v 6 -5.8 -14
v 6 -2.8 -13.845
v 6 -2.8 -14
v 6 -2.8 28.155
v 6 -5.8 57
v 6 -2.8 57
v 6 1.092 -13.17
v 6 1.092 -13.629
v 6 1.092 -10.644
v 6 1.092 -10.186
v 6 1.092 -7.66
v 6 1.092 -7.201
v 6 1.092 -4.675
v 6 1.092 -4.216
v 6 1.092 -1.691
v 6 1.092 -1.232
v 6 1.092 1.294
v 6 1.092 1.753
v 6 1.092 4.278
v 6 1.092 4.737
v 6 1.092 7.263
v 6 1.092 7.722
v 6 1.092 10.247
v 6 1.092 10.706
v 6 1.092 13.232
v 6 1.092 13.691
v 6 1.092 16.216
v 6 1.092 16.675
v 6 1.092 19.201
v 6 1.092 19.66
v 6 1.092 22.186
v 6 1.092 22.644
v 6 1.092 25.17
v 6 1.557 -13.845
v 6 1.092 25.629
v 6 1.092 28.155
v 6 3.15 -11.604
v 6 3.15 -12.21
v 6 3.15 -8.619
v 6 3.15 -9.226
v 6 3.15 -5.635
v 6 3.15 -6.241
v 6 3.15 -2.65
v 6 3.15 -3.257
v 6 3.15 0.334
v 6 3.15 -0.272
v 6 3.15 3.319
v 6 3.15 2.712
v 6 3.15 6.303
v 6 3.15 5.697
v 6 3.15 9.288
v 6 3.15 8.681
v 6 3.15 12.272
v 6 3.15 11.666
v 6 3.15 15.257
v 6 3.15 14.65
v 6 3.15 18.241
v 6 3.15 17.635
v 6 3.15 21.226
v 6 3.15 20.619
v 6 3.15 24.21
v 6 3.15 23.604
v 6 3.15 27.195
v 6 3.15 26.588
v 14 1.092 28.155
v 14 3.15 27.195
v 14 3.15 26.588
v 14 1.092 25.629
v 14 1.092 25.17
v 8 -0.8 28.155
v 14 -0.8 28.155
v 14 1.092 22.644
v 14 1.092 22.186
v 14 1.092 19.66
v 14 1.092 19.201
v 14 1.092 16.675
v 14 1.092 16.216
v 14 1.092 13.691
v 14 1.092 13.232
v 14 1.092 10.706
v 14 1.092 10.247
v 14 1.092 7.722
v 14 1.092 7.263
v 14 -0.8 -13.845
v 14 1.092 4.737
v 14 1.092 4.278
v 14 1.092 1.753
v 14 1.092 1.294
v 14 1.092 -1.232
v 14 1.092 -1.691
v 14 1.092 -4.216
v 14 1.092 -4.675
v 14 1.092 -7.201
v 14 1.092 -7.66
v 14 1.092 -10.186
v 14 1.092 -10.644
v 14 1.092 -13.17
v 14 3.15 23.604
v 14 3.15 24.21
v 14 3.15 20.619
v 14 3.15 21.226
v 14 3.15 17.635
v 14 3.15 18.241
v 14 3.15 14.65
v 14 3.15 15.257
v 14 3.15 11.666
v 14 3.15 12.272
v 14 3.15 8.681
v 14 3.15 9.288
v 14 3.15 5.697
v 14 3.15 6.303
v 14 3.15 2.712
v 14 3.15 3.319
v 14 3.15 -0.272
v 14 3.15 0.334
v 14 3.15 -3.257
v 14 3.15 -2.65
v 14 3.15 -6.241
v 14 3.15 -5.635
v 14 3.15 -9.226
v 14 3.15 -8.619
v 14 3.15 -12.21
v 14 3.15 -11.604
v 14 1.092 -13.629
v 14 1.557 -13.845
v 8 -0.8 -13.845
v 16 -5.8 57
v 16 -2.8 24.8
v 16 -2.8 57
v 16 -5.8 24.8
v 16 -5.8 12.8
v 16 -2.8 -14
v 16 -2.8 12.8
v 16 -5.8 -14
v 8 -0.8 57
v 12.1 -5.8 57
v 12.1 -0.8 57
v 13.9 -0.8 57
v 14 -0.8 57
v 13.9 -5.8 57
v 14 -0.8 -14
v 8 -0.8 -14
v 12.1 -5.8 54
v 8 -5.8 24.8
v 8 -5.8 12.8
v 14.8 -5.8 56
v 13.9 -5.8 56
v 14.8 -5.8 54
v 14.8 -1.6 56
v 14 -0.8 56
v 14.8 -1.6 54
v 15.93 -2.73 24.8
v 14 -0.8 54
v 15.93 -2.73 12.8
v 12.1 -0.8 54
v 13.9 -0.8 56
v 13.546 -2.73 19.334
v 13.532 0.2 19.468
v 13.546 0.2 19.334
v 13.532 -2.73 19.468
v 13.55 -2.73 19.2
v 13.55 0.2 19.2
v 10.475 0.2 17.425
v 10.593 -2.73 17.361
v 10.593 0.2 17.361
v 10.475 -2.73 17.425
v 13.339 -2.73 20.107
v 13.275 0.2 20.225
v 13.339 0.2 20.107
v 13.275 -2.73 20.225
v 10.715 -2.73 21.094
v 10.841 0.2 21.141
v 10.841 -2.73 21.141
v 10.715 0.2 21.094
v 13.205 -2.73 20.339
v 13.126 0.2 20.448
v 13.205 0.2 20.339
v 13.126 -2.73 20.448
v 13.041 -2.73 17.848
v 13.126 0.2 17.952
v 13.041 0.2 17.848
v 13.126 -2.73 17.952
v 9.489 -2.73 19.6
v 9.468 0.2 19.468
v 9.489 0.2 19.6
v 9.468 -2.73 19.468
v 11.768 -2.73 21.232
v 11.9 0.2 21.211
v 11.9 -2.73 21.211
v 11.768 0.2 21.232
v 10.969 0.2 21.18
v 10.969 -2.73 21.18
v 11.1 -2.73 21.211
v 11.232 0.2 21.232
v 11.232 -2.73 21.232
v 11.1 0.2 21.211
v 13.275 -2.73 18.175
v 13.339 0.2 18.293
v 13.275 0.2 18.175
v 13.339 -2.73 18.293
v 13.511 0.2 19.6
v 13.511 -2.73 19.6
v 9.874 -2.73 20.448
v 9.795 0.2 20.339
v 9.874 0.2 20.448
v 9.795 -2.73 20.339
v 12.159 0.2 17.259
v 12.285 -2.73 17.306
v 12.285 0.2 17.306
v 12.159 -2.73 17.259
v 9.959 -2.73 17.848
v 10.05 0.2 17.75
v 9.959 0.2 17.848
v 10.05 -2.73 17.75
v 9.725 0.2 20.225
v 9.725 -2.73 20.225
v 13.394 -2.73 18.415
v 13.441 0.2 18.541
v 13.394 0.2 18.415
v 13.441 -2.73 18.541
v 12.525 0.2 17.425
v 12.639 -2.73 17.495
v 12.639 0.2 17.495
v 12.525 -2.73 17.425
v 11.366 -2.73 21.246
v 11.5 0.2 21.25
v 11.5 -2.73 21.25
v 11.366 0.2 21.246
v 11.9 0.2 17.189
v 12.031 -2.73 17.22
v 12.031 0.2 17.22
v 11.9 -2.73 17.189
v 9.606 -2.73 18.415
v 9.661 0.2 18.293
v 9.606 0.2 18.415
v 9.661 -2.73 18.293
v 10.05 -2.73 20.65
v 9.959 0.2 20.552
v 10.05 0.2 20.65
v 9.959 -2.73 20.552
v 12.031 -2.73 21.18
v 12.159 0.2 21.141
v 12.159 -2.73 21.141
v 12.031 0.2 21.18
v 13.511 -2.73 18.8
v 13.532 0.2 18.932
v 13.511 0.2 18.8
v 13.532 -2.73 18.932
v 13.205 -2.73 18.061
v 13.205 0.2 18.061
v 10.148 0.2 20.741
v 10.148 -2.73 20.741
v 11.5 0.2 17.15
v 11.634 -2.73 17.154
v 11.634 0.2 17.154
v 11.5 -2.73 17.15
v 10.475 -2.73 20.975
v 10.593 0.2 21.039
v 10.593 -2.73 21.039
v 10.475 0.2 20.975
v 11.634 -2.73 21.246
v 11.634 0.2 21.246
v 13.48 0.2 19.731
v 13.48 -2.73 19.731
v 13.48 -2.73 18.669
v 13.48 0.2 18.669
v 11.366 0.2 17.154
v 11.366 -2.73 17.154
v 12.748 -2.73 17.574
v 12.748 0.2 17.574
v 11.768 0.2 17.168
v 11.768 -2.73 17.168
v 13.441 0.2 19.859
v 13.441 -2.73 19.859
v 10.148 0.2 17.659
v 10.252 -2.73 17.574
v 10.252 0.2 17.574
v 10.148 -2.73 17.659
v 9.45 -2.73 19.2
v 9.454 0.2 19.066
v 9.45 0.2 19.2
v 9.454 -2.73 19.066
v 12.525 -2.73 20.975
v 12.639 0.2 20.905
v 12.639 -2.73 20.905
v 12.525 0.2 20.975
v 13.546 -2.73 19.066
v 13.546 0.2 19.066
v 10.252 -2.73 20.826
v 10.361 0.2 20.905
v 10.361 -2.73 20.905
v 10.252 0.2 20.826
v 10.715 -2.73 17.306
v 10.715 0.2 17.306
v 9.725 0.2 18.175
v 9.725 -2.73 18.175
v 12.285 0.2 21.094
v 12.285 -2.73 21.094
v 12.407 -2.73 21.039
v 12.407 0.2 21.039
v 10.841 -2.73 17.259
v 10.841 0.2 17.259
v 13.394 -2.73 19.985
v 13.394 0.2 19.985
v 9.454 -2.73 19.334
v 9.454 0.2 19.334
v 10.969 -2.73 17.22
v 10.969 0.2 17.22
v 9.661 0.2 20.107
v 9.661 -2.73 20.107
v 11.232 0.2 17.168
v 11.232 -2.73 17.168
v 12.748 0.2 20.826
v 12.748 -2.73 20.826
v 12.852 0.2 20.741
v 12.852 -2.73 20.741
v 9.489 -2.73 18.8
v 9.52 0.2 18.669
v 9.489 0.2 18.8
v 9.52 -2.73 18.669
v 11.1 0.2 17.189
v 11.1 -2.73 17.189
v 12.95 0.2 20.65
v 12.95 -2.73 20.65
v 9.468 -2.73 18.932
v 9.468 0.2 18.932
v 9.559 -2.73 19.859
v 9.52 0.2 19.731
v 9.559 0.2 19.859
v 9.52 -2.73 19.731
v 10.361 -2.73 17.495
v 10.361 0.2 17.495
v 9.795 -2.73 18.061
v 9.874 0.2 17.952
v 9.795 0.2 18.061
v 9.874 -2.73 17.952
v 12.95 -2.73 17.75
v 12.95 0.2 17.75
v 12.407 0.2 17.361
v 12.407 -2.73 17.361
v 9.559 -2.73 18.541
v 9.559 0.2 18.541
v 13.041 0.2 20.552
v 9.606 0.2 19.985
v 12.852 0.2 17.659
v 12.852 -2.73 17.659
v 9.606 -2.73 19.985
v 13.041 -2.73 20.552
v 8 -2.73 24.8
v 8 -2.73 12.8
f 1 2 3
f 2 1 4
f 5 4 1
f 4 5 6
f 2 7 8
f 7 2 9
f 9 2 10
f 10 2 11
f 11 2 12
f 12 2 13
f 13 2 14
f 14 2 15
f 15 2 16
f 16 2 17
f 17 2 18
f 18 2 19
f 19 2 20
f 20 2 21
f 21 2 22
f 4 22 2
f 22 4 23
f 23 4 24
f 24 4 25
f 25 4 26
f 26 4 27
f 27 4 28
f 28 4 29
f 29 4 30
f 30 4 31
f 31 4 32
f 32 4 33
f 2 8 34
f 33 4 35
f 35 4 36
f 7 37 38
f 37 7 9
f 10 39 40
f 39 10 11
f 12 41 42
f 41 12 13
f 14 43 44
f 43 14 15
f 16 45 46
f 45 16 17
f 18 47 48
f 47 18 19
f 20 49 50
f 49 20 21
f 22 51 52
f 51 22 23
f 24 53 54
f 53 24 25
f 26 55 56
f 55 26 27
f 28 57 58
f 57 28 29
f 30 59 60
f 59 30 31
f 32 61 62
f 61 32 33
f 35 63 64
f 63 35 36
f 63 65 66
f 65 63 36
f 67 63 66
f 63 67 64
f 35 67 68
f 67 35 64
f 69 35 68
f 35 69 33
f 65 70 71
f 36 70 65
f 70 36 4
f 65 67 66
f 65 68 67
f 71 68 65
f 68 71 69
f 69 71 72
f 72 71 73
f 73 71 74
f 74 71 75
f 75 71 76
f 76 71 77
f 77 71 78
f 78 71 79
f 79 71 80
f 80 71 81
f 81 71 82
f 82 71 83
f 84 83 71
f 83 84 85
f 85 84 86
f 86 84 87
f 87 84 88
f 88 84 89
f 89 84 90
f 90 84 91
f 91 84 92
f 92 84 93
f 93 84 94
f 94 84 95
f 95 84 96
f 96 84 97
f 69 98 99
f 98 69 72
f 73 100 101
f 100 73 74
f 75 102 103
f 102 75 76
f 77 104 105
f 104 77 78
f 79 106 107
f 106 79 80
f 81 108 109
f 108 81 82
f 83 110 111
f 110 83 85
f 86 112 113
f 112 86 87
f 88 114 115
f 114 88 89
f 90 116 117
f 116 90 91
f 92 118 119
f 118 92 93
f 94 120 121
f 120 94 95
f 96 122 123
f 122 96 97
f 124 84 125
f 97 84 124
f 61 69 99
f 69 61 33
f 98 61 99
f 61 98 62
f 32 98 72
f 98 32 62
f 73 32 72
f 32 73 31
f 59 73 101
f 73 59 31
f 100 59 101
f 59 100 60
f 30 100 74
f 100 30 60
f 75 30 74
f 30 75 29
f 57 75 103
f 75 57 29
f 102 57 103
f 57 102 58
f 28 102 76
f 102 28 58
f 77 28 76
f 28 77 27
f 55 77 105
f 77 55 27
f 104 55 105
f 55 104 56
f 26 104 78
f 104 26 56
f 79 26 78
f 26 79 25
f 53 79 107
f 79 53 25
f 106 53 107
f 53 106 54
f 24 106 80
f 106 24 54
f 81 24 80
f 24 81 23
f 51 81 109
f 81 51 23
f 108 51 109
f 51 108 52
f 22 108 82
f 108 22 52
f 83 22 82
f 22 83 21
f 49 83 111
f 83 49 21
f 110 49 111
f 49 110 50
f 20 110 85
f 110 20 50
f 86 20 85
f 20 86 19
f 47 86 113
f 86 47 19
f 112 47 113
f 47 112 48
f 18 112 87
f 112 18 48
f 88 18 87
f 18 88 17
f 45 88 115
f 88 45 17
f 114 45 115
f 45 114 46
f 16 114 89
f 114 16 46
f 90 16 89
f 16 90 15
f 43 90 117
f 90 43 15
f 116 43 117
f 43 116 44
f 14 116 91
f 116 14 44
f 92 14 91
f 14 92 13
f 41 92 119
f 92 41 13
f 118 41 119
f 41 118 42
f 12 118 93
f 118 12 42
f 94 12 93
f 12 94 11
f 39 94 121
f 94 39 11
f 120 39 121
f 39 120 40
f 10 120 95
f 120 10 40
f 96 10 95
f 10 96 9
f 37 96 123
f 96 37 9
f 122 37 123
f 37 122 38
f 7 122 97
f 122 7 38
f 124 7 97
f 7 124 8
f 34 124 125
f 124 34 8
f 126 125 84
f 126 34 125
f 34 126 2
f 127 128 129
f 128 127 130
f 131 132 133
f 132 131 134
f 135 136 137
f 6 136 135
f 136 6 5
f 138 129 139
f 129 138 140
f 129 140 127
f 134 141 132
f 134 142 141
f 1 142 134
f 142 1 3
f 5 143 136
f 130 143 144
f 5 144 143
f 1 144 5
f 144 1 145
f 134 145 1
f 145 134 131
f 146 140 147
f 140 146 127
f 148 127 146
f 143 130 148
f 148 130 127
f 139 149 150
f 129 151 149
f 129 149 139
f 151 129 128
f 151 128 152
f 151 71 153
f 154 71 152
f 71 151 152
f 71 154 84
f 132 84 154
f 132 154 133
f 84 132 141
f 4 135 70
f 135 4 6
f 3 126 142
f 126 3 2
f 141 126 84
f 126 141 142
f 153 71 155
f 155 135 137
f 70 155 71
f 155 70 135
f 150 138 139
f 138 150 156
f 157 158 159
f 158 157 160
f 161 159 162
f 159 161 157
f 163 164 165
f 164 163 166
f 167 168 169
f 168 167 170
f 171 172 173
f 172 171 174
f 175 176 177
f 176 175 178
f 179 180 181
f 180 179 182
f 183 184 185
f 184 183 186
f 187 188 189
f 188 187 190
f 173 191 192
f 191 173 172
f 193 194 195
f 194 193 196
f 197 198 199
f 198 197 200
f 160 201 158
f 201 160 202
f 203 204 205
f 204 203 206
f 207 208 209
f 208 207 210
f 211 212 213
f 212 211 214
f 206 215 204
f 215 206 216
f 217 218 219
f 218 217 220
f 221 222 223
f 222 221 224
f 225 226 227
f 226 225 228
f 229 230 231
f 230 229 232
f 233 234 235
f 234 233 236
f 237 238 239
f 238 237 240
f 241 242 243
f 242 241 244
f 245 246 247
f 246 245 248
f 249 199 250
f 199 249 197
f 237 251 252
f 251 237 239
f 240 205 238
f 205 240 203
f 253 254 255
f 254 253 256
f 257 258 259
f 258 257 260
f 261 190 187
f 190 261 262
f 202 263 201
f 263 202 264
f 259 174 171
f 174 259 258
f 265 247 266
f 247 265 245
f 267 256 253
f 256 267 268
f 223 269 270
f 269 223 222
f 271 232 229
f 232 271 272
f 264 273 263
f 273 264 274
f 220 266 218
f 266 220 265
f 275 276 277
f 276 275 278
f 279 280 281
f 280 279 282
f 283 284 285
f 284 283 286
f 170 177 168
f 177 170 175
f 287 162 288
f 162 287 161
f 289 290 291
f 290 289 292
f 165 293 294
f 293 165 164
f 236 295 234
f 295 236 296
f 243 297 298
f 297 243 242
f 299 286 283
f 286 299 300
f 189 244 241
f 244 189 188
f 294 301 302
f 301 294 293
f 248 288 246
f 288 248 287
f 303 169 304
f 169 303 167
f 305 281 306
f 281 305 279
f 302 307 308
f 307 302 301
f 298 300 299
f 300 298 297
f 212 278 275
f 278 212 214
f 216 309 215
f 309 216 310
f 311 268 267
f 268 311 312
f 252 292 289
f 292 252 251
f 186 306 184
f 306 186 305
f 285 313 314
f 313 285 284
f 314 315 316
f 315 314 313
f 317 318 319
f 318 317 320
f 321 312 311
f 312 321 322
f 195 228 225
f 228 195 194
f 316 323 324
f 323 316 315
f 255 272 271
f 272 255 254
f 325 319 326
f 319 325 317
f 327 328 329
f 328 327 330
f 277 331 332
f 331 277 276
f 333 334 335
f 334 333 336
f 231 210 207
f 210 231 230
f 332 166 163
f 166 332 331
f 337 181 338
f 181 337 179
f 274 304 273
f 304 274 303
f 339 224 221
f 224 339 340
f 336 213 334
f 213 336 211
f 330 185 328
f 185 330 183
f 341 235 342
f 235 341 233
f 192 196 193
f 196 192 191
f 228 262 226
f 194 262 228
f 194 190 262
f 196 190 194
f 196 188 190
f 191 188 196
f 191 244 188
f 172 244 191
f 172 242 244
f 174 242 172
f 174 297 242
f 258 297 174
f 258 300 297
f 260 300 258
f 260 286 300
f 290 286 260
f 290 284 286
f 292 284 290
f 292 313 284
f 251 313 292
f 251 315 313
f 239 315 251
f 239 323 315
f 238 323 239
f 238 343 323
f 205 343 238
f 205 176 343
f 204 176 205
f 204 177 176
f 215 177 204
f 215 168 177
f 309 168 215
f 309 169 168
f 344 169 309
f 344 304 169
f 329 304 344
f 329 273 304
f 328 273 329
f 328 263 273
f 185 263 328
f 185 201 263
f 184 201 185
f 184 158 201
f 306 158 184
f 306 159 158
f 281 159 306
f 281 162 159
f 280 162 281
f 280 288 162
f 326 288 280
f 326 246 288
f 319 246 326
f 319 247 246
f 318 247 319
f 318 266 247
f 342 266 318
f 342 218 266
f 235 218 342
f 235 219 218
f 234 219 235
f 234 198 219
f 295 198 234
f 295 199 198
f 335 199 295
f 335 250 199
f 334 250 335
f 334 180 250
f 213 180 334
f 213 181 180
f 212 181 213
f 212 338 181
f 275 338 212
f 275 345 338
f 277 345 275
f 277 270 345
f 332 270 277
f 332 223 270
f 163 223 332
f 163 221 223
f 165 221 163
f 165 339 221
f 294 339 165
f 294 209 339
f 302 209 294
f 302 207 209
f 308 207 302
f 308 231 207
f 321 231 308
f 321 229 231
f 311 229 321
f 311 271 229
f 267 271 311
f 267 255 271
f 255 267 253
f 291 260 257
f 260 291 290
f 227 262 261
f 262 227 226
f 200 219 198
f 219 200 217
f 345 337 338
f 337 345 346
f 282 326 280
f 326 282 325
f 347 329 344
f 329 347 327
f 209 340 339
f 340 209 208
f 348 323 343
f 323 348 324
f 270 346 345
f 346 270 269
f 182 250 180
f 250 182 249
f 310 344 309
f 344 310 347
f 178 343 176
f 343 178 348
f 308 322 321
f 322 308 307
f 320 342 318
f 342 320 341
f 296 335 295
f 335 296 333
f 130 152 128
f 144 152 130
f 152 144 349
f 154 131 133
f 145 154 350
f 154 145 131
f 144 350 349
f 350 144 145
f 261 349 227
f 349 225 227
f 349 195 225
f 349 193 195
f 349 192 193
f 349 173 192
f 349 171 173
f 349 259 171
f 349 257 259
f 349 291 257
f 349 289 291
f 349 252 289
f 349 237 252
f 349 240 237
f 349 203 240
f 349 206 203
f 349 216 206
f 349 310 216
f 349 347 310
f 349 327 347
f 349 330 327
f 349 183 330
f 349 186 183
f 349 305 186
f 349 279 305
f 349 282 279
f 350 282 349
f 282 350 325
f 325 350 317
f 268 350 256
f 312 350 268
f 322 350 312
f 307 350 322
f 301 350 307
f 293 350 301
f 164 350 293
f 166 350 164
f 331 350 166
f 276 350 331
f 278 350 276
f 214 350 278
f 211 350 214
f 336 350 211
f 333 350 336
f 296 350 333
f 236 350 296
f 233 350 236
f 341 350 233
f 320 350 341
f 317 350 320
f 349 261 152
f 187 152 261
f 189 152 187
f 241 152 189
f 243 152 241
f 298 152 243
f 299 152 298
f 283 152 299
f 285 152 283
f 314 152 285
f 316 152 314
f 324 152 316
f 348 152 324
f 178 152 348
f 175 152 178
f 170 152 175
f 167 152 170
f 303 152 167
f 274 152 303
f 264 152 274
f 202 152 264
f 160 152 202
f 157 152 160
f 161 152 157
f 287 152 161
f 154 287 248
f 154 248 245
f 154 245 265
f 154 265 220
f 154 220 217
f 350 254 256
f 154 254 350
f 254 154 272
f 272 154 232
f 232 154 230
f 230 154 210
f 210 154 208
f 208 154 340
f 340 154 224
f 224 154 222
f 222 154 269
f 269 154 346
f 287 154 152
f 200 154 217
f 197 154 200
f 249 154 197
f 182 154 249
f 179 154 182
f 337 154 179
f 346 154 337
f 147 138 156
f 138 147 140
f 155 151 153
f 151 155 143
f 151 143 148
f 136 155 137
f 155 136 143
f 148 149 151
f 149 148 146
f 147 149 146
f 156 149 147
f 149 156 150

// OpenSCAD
$fn = 96;

// Redesigned and modified from https://www.thingiverse.com/thing:5719788
// Now available in OpenSCAD, for further modifications
// Gears from: https://www.thingiverse.com/thing:1604369
// Its mostly in german, but you should be ok...
// To Do:
// Implement gears as imported library

//color("DarkSlateGray") translate([-25,8,9.6]) rotate([90,0,90]) import("StepMotorModelScaled.stl");

//Z_rail ();
//Z_gearwheel ();
Z_rackpen ();

//linear_extrude(32, center=true, scale=1) polygon(points=[[0,0],[2,2],[8,2],[10,0]]);


//color("fuchsia") translate([0,tight-0.2,15]) Z_rack ();
// Z-rack with mounatble penHolder
module Z_rackpen(){
  translate([0,0,10]) difference(){
    color("fuchsia") translate([0,tight-0.2,15]) Z_rack ();
    translate([11.5,0.2,9.2]) rotate([90,0,0]) cylinder(21, d=4.1, center=false); // penholder-Holes
    translate([13,-6.68+tight,8.8]) cube([10,3.1,12], center = true); 
    translate([13.0,-6.68+tight,50]) cube([1.8,18.1,12], center = true); 
    translate([13.8,-6.68+tight,45]) cube([2.0,18.1,2], center = true); 
  }
}

//translate([25.5,-6.8+tight,18.5]) penHolder();
//translate([25.5,-6.8+tight,18.5]) brushInsert();
// handWheel();

// general shape of mechanism
round_edge = 3; // dont go more than 5
slide_tol = 0.6; // adjust this for tolerance
tight = 2.4; // Moves the rack closer to the wheel. Needs to be changed when gearwheel size changes
dist = 6; // i dont know what this parameter does...
overallHeight = 64; // not yet implemented

// gears and wheels
tooth_angle = 0;
tooth_size = 1; // modul = Height of the tooth tip above the pitch line
rackWidth = 8; // width of rack with teeth
rackDepth= 6; // depth of rack with teeth (some mistake when this is not 6)

// Holes and screws
M3_screwhole = 2.8; // tight to screw into it
M3_hole = 3.5; // loose to push screw through it
M3_screwhead = 5.8; // lower the screwhead into the material
M4_screwhole = 3.9; // tight to screw into it
brushHole = 6.5;

module brushInsert(){
    difference(){
      cylinder(h = 13, d = 10.4, center = true);
      #cylinder(h = 22, d = brushHole, center = true);
      translate([0,-0,0]) rotate([90,0,0]) cylinder(14, d=4, center=false); // penholder-Holes
    }
}

module handWheel() difference(){
    minkowski(){
    stirnrad (modul=2, zahnzahl=8, breite=3, bohrung=3.8, eingriffswinkel=30, schraegungswinkel=tooth_angle, optimiert=true);
         $fn=30;
            sphere(d=1); 
    }
    translate([0,-0,-2]) cylinder(14, d=3.7, center=false); // penholder-Holes
    }

module penHolder(){

    difference(){
        minkowski(){
        union(){            
            cylinder(h = 11, d =12, center = true);
            translate([0,-7,0]) rotate([90,0,0]) cylinder(h = 3, d =8, center = true);
          }
            $fn=30;
            sphere(d=2);  
        }
        cylinder(h = 23, d =11, center = true);
        translate([0,-2,0]) rotate([90,0,0]) cylinder(20, d=3.8, center=false); // penholder-Holes
    }


    difference(){
        union(){
            translate([-11.5,0,-0.8]) cube([12,3,11.3], center = true);
            translate([-14,-3,0]) rotate([90,0,0]) cylinder(h = 3, d =7, center = true);
        }
    translate([-14,10,0]) rotate([90,0,0]) cylinder(20, d=2.9, center=false); // penholder-Holes
    
    }
}

module Z_rail (){
difference(){
  minkowski(){
    union(){
        difference(){
            translate([1,-10,20+4]) cube([14-round_edge,10-round_edge,46+8-round_edge],center=true); // Vertikal
            translate([2,-18,2]) cube([20,50,32+8]);
            translate([2,-9,-12+2]) cube([20,50,30]);
            
        }
    translate([-3,8,8]) cube([6-round_edge,46-round_edge,12-round_edge],center=true); // Balken
        difference(){
            translate([11,-4,12+4]) cube([18-round_edge,22-round_edge,62+8-round_edge],center=true); // Z-Rail
            translate([10,7.0,36.5]) cube([28.0,10.1,30], center = true);
            translate([0,-18,2]) cube([20,50,40]);
            translate([0,-3+2,-32+0]) cube([20,50,60]);
           
        }
    }
    $fn=30;
    sphere(d=round_edge);
  }
 #translate([rackWidth/2+dist+1,-rackDepth-0.5+tight-0.5*slide_tol,14]) cube([rackWidth+2+slide_tol,3+0.5*slide_tol,70+8],center=true); // Führung
  translate([rackWidth/2+dist,-2+tight-0.5*slide_tol,0]) cube([rackWidth+slide_tol,rackDepth+0.5*slide_tol,70],center=true); // Führung
  translate([rackWidth/2+dist-4,-4.55+tight-1*slide_tol,15.9]) rotate([0,0,0]) linear_extrude(78.2, center=true, scale=1) polygon(points=[[-slide_tol/2,0],[2,2+slide_tol/2],[8,2+slide_tol/2],[10+slide_tol/2,0]]);
  translate([-10,8,0]) rotate([0,90,0]) cylinder(20, d=12, center=false); // MotorCenter
  translate([-10,25.7,8.2]) rotate([0,90,0]) cylinder(20, d=3.5, center=false); // MotorScrewHoles
  translate([-2,25.7,8.2]) rotate([0,90,0]) cylinder(8.1, d=5.8, center=false); // MotorHolesHead
  translate([-10,-9.7,8.2]) rotate([0,90,0]) cylinder(20, d=3.5, center=false); // MotorScrewHoles
  translate([-2,-9.7,8.2]) rotate([0,90,0]) cylinder(8.1, d=5.8, center=false); // MotorScrewHead
  //Rubber Holder
  translate([18,-6.68+tight,37.5]) cube([2.0,28.1,12], center = true);
  translate([16,-6.68+tight+9,46.5]) rotate([0,-28,0]) cube([2.0,8.1,12], center = true);
  translate([16,-6.68+tight-13,46.5]) rotate([0,-28,0]) cube([2.0,8.1,12], center = true);
  

}
}

module Z_rack (){
// Stange
translate([dist,0,-19]) rotate([0,90,0]) zahnstange(modul=1, laenge=42, hoehe=rackDepth, breite=rackWidth, eingriffswinkel=25, schraegungswinkel=tooth_angle);
translate([rackWidth/2+dist+1,-rackDepth-0.5,-3.5]) cube([rackWidth+2,3,64+7],center=true);
    translate([rackWidth/2+dist-4,-rackDepth+1,-3.5]) rotate([0,0,0]) linear_extrude(71, center=true, scale=1) polygon(points=[[0,0],[2,2],[8,2],[10,0]]);
    
}

module Z_gearwheel (){
// Stirnrad 
translate([14,8,0]) rotate([0,-90,0]) mirror([1,0,0]) difference(){
    stirnrad (modul=1, zahnzahl=12, breite=rackWidth, bohrung=0, eingriffswinkel=25, schraegungswinkel=tooth_angle, optimiert=true);
    }
translate([-2,8,0]) rotate([0,90,0]) difference(){
    cylinder(10, d=8, center=false);
    shaft ();
    }
}

module old (){
color("PaleVioletRed") translate([6.2,2,15.5]) rotate([0,-90,0]) import("Holder_closed.stl");
color("fuchsia") translate([-4,0,0]) rotate([-90,0,0]) import("Z_rack.stl");
translate([36,-8,-16]) rotate([-90,0,90]) import("Z.stl");
color("HotPink") translate([10,14.5,2]) rotate([0,180,0]) import("Z_gear.stl");
color("DarkSlateGray") translate([5,14.5,-36]) rotate([0,0,90]) import("StepMotorModelScaled.stl");
}

module shaft (){
$fn=96;
  difference(){
    cylinder(h= 10, d=5, center= false);
    translate([-5,1.5,-1]) cube([10,10, 20]);
    translate([-5,-11.5,-1]) cube([10,10, 20]);
    }
}


/* Bibliothek für Evolventen-Zahnräder, Schnecken und Zahnstangen

Enthält die Module
- zahnstange(modul, laenge, hoehe, breite, eingriffswinkel=20, schraegungswinkel=0)
- stirnrad(modul, zahnzahl, breite, bohrung, eingriffswinkel=20, schraegungswinkel=0, optimiert=true)
- zahnstange_und_rad (modul, laenge_stange, zahnzahl_rad, hoehe_stange, bohrung_rad, breite, eingriffswinkel=20, schraegungswinkel=0, zusammen_gebaut=true, optimiert=true)


Beispiele für jedes Modul befinden sich auskommentiert am Ende dieser Datei

Autor:		Dr Jörg Janssen
Stand:		29. Oktober 2018
Version:	2.3
Lizenz:		Creative Commons - Attribution, Non Commercial, Share Alike

Erlaubte Module nach DIN 780:
0.05 0.06 0.08 0.10 0.12 0.16
0.20 0.25 0.3  0.4  0.5  0.6
0.7  0.8  0.9  1    1.25 1.5
2    2.5  3    4    5    6
8    10   12   16   20   25
32   40   50   60

*/

//translate([6,0,0]) rotate([0,90,0]) zahnstange_und_rad (modul=1.0, laenge_stange=70, zahnzahl_rad=15, hoehe_stange=6, bohrung_rad=1, breite=8, eingriffswinkel=25, schraegungswinkel=-10, zusammen_gebaut=true, optimiert=true);

// Allgemeine Variablen
pi = 3.14159;
rad = 57.29578;
spiel = 0.05;	// Spiel zwischen Zähnen

// zahnstange(modul=1, laenge=30, hoehe=5, breite=5, eingriffswinkel=20, schraegungswinkel=20);

// stirnrad (modul=1, zahnzahl=30, breite=5, bohrung=4, eingriffswinkel=20, schraegungswinkel=20, optimiert=true);

/*	Wandelt Radian in Grad um */
function grad(eingriffswinkel) = eingriffswinkel*rad;

/*	Wandelt Grad in Radian um */
function radian(eingriffswinkel) = eingriffswinkel/rad;

/*	Wandelt 2D-Polarkoordinaten in kartesische um
    Format: radius, phi; phi = Winkel zur x-Achse auf xy-Ebene */
function pol_zu_kart(polvect) = [
	polvect[0]*cos(polvect[1]),  
	polvect[0]*sin(polvect[1])
];

/*	Kreisevolventen-Funktion:
    Gibt die Polarkoordinaten einer Kreisevolvente aus
    r = Radius des Grundkreises
    rho = Abrollwinkel in Grad */
function ev(r,rho) = [
	r/cos(rho),
	grad(tan(rho)-radian(rho))
];

/*  Kugelevolventen-Funktion
    Gibt den Azimutwinkel einer Kugelevolvente aus
    theta0 = Polarwinkel des Kegels, an dessen Schnittkante zur Großkugel die Evolvente abrollt
    theta = Polarwinkel, für den der Azimutwinkel der Evolvente berechnet werden soll */
function kugelev(theta0,theta) = 1/sin(theta0)*acos(cos(theta)/cos(theta0))-acos(tan(theta0)/tan(theta));

/*  Wandelt Kugelkoordinaten in kartesische um
    Format: radius, theta, phi; theta = Winkel zu z-Achse, phi = Winkel zur x-Achse auf xy-Ebene */
function kugel_zu_kart(vect) = [
	vect[0]*sin(vect[1])*cos(vect[2]),  
	vect[0]*sin(vect[1])*sin(vect[2]),
	vect[0]*cos(vect[1])
];

/*	prüft, ob eine Zahl gerade ist
	= 1, wenn ja
	= 0, wenn die Zahl nicht gerade ist */
function istgerade(zahl) =
	(zahl == floor(zahl/2)*2) ? 1 : 0;

/*	größter gemeinsamer Teiler
	nach Euklidischem Algorithmus.
	Sortierung: a muss größer als b sein */
function ggt(a,b) = 
	a%b == 0 ? b : ggt(b,a%b);

/*	Polarfunktion mit polarwinkel und zwei variablen */
function spirale(a, r0, phi) =
	a*phi + r0; 

/*	Kopiert und dreht einen Körper */
module kopiere(vect, zahl, abstand, winkel){
	for(i = [0:zahl-1]){
		translate(v=vect*abstand*i)
			rotate(a=i*winkel, v = [0,0,1])
				children(0);
	}
}

/*  Zahnstange
    modul = Höhe des Zahnkopfes über der Wälzgeraden
    laenge = Länge der Zahnstange
    hoehe = Höhe der Zahnstange bis zur Wälzgeraden
    breite = Breite eines Zahns
    eingriffswinkel = Eingriffswinkel, Standardwert = 20° gemäß DIN 867. Sollte nicht größer als 45° sein.
    schraegungswinkel = Schrägungswinkel zur Zahnstangen-Querachse; 0° = Geradverzahnung */
module zahnstange(modul, laenge, hoehe, breite, eingriffswinkel = 20, schraegungswinkel = 0) {

	// Dimensions-Berechnungen
	modul=modul*(1-spiel);
	c = modul / 6;												// Kopfspiel
	mx = modul/cos(schraegungswinkel);							// Durch Schrägungswinkel verzerrtes modul in x-Richtung
	a = 2*mx*tan(eingriffswinkel)+c*tan(eingriffswinkel);		// Flankenbreite
	b = pi*mx/2-2*mx*tan(eingriffswinkel);						// Kopfbreite
	x = breite*tan(schraegungswinkel);							// Verschiebung der Oberseite in x-Richtung durch Schrägungswinkel
	nz = ceil((laenge+abs(2*x))/(pi*mx));						// Anzahl der Zähne
	
	translate([-pi*mx*(nz-1)/2-a-b/2,-modul,0]){
		intersection(){											// Erzeugt ein Prisma, das in eine Quadergeometrie eingepasst wird
			kopiere([1,0,0], nz, pi*mx, 0){
				polyhedron(
					points=[[0,-c,0], [a,2*modul,0], [a+b,2*modul,0], [2*a+b,-c,0], [pi*mx,-c,0], [pi*mx,modul-hoehe,0], [0,modul-hoehe,0],	// Unterseite
						[0+x,-c,breite], [a+x,2*modul,breite], [a+b+x,2*modul,breite], [2*a+b+x,-c,breite], [pi*mx+x,-c,breite], [pi*mx+x,modul-hoehe,breite], [0+x,modul-hoehe,breite]],	// Oberseite
					faces=[[6,5,4,3,2,1,0],						// Unterseite
						[1,8,7,0],
						[9,8,1,2],
						[10,9,2,3],
						[11,10,3,4],
						[12,11,4,5],
						[13,12,5,6],
						[7,13,6,0],
						[7,8,9,10,11,12,13],					// Oberseite
					]
				);
			};
			translate([abs(x),-hoehe+modul-0.5,-0.5]){
				cube([laenge,hoehe+modul+1,breite+1]);			// Quader, der das Volumen der Zahnstange umfasst
			}	
		};
	};	
}

/*  Stirnrad
    modul = Höhe des Zahnkopfes über dem Teilkreis
    zahnzahl = Anzahl der Radzähne
    breite = Zahnbreite
    bohrung = Durchmesser der Mittelbohrung
    eingriffswinkel = Eingriffswinkel, Standardwert = 20° gemäß DIN 867. Sollte nicht größer als 45° sein.
    schraegungswinkel = Schrägungswinkel zur Rotationsachse; 0° = Geradverzahnung
	optimiert = Löcher zur Material-/Gewichtsersparnis bzw. Oberflächenvergößerung erzeugen, wenn Geometrie erlaubt */
module stirnrad(modul, zahnzahl, breite, bohrung, eingriffswinkel = 20, schraegungswinkel = 0, optimiert = true) {

	// Dimensions-Berechnungen	
	d = modul * zahnzahl;											// Teilkreisdurchmesser
	r = d / 2;														// Teilkreisradius
	alpha_stirn = atan(tan(eingriffswinkel)/cos(schraegungswinkel));// Schrägungswinkel im Stirnschnitt
	db = d * cos(alpha_stirn);										// Grundkreisdurchmesser
	rb = db / 2;													// Grundkreisradius
	da = (modul <1)? d + modul * 2.2 : d + modul * 2;				// Kopfkreisdurchmesser nach DIN 58400 bzw. DIN 867
	ra = da / 2;													// Kopfkreisradius
	c =  (zahnzahl <3)? 0 : modul/6;								// Kopfspiel
	df = d - 2 * (modul + c);										// Fußkreisdurchmesser
	rf = df / 2;													// Fußkreisradius
	rho_ra = acos(rb/ra);											// maximaler Abrollwinkel;
																	// Evolvente beginnt auf Grundkreis und endet an Kopfkreis
	rho_r = acos(rb/r);												// Abrollwinkel am Teilkreis;
																	// Evolvente beginnt auf Grundkreis und endet an Kopfkreis
	phi_r = grad(tan(rho_r)-radian(rho_r));							// Winkel zum Punkt der Evolvente auf Teilkreis
	gamma = rad*breite/(r*tan(90-schraegungswinkel));				// Torsionswinkel für Extrusion
	schritt = rho_ra/16;											// Evolvente wird in 16 Stücke geteilt
	tau = 360/zahnzahl;												// Teilungswinkel
	
	r_loch = (2*rf - bohrung)/8;									// Radius der Löcher für Material-/Gewichtsersparnis
	rm = bohrung/2+2*r_loch;										// Abstand der Achsen der Löcher von der Hauptachse
	z_loch = floor(2*pi*rm/(3*r_loch));								// Anzahl der Löcher für Material-/Gewichtsersparnis
	
	optimiert = (optimiert && r >= breite*1.5 && d > 2*bohrung);	// ist Optimierung sinnvoll?

	// Zeichnung
	union(){
		rotate([0,0,-phi_r-90*(1-spiel)/zahnzahl]){						// Zahn auf x-Achse zentrieren;
																		// macht Ausrichtung mit anderen Rädern einfacher

			linear_extrude(height = breite, twist = gamma){
				difference(){
					union(){
						zahnbreite = (180*(1-spiel))/zahnzahl+2*phi_r;
						circle(rf);										// Fußkreis	
						for (rot = [0:tau:360]){
							rotate (rot){								// "Zahnzahl-mal" kopieren und drehen
								polygon(concat(							// Zahn
									[[0,0]],							// Zahnsegment beginnt und endet im Ursprung
									[for (rho = [0:schritt:rho_ra])		// von null Grad (Grundkreis)
																		// bis maximalen Evolventenwinkel (Kopfkreis)
										pol_zu_kart(ev(rb,rho))],		// Erste Evolventen-Flanke

									[pol_zu_kart(ev(rb,rho_ra))],		// Punkt der Evolvente auf Kopfkreis

									[for (rho = [rho_ra:-schritt:0])	// von maximalen Evolventenwinkel (Kopfkreis)
																		// bis null Grad (Grundkreis)
										pol_zu_kart([ev(rb,rho)[0], zahnbreite-ev(rb,rho)[1]])]
																		// Zweite Evolventen-Flanke
																		// (180*(1-spiel)) statt 180 Grad,
																		// um Spiel an den Flanken zu erlauben
									)
								);
							}
						}
					}			
					circle(r = rm+r_loch*1.49);							// "Bohrung"
				}
			}
		}
		// mit Materialersparnis
		if (optimiert) {
			linear_extrude(height = breite){
				difference(){
						circle(r = (bohrung+r_loch)/2);
						circle(r = bohrung/2);							// Bohrung
					}
				}
			linear_extrude(height = (breite-r_loch/2 < breite*2/3) ? breite*2/3 : breite-r_loch/2){
				difference(){
					circle(r=rm+r_loch*1.51);
					union(){
						circle(r=(bohrung+r_loch)/2);
						for (i = [0:1:z_loch]){
							translate(kugel_zu_kart([rm,90,i*360/z_loch]))
								circle(r = r_loch);
						}
					}
				}
			}
		}
		// ohne Materialersparnis
		else {
			linear_extrude(height = breite){
				difference(){
					circle(r = rm+r_loch*1.51);
					circle(r = bohrung/2);
				}
			}
		}
	}
}


/*	Zahnstange und -Rad
    modul = Höhe des Zahnkopfes über dem Teilkreis
    laenge_stange = Laenge der Zahnstange
    zahnzahl_rad = Anzahl der Radzähne
	hoehe_stange = Höhe der Zahnstange bis zur Wälzgeraden
    bohrung_rad = Durchmesser der Mittelbohrung des Stirnrads
	breite = Breite eines Zahns
    eingriffswinkel = Eingriffswinkel, Standardwert = 20° gemäß DIN 867. Sollte nicht größer als 45° sein.
    schraegungswinkel = Schrägungswinkel zur Rotationsachse, Standardwert = 0° (Geradverzahnung) */
module zahnstange_und_rad (modul, laenge_stange, zahnzahl_rad, hoehe_stange, bohrung_rad, breite, eingriffswinkel=20, schraegungswinkel=0, zusammen_gebaut=true, optimiert=true) {

	abstand = zusammen_gebaut? modul*zahnzahl_rad/2 : modul*zahnzahl_rad;

	zahnstange(modul, laenge_stange, hoehe_stange, breite, eingriffswinkel, -schraegungswinkel);
	translate([0,abstand,0])
		rotate(a=360/zahnzahl_rad)
			stirnrad (modul, zahnzahl_rad, breite, bohrung_rad, eingriffswinkel, schraegungswinkel, optimiert);
}
